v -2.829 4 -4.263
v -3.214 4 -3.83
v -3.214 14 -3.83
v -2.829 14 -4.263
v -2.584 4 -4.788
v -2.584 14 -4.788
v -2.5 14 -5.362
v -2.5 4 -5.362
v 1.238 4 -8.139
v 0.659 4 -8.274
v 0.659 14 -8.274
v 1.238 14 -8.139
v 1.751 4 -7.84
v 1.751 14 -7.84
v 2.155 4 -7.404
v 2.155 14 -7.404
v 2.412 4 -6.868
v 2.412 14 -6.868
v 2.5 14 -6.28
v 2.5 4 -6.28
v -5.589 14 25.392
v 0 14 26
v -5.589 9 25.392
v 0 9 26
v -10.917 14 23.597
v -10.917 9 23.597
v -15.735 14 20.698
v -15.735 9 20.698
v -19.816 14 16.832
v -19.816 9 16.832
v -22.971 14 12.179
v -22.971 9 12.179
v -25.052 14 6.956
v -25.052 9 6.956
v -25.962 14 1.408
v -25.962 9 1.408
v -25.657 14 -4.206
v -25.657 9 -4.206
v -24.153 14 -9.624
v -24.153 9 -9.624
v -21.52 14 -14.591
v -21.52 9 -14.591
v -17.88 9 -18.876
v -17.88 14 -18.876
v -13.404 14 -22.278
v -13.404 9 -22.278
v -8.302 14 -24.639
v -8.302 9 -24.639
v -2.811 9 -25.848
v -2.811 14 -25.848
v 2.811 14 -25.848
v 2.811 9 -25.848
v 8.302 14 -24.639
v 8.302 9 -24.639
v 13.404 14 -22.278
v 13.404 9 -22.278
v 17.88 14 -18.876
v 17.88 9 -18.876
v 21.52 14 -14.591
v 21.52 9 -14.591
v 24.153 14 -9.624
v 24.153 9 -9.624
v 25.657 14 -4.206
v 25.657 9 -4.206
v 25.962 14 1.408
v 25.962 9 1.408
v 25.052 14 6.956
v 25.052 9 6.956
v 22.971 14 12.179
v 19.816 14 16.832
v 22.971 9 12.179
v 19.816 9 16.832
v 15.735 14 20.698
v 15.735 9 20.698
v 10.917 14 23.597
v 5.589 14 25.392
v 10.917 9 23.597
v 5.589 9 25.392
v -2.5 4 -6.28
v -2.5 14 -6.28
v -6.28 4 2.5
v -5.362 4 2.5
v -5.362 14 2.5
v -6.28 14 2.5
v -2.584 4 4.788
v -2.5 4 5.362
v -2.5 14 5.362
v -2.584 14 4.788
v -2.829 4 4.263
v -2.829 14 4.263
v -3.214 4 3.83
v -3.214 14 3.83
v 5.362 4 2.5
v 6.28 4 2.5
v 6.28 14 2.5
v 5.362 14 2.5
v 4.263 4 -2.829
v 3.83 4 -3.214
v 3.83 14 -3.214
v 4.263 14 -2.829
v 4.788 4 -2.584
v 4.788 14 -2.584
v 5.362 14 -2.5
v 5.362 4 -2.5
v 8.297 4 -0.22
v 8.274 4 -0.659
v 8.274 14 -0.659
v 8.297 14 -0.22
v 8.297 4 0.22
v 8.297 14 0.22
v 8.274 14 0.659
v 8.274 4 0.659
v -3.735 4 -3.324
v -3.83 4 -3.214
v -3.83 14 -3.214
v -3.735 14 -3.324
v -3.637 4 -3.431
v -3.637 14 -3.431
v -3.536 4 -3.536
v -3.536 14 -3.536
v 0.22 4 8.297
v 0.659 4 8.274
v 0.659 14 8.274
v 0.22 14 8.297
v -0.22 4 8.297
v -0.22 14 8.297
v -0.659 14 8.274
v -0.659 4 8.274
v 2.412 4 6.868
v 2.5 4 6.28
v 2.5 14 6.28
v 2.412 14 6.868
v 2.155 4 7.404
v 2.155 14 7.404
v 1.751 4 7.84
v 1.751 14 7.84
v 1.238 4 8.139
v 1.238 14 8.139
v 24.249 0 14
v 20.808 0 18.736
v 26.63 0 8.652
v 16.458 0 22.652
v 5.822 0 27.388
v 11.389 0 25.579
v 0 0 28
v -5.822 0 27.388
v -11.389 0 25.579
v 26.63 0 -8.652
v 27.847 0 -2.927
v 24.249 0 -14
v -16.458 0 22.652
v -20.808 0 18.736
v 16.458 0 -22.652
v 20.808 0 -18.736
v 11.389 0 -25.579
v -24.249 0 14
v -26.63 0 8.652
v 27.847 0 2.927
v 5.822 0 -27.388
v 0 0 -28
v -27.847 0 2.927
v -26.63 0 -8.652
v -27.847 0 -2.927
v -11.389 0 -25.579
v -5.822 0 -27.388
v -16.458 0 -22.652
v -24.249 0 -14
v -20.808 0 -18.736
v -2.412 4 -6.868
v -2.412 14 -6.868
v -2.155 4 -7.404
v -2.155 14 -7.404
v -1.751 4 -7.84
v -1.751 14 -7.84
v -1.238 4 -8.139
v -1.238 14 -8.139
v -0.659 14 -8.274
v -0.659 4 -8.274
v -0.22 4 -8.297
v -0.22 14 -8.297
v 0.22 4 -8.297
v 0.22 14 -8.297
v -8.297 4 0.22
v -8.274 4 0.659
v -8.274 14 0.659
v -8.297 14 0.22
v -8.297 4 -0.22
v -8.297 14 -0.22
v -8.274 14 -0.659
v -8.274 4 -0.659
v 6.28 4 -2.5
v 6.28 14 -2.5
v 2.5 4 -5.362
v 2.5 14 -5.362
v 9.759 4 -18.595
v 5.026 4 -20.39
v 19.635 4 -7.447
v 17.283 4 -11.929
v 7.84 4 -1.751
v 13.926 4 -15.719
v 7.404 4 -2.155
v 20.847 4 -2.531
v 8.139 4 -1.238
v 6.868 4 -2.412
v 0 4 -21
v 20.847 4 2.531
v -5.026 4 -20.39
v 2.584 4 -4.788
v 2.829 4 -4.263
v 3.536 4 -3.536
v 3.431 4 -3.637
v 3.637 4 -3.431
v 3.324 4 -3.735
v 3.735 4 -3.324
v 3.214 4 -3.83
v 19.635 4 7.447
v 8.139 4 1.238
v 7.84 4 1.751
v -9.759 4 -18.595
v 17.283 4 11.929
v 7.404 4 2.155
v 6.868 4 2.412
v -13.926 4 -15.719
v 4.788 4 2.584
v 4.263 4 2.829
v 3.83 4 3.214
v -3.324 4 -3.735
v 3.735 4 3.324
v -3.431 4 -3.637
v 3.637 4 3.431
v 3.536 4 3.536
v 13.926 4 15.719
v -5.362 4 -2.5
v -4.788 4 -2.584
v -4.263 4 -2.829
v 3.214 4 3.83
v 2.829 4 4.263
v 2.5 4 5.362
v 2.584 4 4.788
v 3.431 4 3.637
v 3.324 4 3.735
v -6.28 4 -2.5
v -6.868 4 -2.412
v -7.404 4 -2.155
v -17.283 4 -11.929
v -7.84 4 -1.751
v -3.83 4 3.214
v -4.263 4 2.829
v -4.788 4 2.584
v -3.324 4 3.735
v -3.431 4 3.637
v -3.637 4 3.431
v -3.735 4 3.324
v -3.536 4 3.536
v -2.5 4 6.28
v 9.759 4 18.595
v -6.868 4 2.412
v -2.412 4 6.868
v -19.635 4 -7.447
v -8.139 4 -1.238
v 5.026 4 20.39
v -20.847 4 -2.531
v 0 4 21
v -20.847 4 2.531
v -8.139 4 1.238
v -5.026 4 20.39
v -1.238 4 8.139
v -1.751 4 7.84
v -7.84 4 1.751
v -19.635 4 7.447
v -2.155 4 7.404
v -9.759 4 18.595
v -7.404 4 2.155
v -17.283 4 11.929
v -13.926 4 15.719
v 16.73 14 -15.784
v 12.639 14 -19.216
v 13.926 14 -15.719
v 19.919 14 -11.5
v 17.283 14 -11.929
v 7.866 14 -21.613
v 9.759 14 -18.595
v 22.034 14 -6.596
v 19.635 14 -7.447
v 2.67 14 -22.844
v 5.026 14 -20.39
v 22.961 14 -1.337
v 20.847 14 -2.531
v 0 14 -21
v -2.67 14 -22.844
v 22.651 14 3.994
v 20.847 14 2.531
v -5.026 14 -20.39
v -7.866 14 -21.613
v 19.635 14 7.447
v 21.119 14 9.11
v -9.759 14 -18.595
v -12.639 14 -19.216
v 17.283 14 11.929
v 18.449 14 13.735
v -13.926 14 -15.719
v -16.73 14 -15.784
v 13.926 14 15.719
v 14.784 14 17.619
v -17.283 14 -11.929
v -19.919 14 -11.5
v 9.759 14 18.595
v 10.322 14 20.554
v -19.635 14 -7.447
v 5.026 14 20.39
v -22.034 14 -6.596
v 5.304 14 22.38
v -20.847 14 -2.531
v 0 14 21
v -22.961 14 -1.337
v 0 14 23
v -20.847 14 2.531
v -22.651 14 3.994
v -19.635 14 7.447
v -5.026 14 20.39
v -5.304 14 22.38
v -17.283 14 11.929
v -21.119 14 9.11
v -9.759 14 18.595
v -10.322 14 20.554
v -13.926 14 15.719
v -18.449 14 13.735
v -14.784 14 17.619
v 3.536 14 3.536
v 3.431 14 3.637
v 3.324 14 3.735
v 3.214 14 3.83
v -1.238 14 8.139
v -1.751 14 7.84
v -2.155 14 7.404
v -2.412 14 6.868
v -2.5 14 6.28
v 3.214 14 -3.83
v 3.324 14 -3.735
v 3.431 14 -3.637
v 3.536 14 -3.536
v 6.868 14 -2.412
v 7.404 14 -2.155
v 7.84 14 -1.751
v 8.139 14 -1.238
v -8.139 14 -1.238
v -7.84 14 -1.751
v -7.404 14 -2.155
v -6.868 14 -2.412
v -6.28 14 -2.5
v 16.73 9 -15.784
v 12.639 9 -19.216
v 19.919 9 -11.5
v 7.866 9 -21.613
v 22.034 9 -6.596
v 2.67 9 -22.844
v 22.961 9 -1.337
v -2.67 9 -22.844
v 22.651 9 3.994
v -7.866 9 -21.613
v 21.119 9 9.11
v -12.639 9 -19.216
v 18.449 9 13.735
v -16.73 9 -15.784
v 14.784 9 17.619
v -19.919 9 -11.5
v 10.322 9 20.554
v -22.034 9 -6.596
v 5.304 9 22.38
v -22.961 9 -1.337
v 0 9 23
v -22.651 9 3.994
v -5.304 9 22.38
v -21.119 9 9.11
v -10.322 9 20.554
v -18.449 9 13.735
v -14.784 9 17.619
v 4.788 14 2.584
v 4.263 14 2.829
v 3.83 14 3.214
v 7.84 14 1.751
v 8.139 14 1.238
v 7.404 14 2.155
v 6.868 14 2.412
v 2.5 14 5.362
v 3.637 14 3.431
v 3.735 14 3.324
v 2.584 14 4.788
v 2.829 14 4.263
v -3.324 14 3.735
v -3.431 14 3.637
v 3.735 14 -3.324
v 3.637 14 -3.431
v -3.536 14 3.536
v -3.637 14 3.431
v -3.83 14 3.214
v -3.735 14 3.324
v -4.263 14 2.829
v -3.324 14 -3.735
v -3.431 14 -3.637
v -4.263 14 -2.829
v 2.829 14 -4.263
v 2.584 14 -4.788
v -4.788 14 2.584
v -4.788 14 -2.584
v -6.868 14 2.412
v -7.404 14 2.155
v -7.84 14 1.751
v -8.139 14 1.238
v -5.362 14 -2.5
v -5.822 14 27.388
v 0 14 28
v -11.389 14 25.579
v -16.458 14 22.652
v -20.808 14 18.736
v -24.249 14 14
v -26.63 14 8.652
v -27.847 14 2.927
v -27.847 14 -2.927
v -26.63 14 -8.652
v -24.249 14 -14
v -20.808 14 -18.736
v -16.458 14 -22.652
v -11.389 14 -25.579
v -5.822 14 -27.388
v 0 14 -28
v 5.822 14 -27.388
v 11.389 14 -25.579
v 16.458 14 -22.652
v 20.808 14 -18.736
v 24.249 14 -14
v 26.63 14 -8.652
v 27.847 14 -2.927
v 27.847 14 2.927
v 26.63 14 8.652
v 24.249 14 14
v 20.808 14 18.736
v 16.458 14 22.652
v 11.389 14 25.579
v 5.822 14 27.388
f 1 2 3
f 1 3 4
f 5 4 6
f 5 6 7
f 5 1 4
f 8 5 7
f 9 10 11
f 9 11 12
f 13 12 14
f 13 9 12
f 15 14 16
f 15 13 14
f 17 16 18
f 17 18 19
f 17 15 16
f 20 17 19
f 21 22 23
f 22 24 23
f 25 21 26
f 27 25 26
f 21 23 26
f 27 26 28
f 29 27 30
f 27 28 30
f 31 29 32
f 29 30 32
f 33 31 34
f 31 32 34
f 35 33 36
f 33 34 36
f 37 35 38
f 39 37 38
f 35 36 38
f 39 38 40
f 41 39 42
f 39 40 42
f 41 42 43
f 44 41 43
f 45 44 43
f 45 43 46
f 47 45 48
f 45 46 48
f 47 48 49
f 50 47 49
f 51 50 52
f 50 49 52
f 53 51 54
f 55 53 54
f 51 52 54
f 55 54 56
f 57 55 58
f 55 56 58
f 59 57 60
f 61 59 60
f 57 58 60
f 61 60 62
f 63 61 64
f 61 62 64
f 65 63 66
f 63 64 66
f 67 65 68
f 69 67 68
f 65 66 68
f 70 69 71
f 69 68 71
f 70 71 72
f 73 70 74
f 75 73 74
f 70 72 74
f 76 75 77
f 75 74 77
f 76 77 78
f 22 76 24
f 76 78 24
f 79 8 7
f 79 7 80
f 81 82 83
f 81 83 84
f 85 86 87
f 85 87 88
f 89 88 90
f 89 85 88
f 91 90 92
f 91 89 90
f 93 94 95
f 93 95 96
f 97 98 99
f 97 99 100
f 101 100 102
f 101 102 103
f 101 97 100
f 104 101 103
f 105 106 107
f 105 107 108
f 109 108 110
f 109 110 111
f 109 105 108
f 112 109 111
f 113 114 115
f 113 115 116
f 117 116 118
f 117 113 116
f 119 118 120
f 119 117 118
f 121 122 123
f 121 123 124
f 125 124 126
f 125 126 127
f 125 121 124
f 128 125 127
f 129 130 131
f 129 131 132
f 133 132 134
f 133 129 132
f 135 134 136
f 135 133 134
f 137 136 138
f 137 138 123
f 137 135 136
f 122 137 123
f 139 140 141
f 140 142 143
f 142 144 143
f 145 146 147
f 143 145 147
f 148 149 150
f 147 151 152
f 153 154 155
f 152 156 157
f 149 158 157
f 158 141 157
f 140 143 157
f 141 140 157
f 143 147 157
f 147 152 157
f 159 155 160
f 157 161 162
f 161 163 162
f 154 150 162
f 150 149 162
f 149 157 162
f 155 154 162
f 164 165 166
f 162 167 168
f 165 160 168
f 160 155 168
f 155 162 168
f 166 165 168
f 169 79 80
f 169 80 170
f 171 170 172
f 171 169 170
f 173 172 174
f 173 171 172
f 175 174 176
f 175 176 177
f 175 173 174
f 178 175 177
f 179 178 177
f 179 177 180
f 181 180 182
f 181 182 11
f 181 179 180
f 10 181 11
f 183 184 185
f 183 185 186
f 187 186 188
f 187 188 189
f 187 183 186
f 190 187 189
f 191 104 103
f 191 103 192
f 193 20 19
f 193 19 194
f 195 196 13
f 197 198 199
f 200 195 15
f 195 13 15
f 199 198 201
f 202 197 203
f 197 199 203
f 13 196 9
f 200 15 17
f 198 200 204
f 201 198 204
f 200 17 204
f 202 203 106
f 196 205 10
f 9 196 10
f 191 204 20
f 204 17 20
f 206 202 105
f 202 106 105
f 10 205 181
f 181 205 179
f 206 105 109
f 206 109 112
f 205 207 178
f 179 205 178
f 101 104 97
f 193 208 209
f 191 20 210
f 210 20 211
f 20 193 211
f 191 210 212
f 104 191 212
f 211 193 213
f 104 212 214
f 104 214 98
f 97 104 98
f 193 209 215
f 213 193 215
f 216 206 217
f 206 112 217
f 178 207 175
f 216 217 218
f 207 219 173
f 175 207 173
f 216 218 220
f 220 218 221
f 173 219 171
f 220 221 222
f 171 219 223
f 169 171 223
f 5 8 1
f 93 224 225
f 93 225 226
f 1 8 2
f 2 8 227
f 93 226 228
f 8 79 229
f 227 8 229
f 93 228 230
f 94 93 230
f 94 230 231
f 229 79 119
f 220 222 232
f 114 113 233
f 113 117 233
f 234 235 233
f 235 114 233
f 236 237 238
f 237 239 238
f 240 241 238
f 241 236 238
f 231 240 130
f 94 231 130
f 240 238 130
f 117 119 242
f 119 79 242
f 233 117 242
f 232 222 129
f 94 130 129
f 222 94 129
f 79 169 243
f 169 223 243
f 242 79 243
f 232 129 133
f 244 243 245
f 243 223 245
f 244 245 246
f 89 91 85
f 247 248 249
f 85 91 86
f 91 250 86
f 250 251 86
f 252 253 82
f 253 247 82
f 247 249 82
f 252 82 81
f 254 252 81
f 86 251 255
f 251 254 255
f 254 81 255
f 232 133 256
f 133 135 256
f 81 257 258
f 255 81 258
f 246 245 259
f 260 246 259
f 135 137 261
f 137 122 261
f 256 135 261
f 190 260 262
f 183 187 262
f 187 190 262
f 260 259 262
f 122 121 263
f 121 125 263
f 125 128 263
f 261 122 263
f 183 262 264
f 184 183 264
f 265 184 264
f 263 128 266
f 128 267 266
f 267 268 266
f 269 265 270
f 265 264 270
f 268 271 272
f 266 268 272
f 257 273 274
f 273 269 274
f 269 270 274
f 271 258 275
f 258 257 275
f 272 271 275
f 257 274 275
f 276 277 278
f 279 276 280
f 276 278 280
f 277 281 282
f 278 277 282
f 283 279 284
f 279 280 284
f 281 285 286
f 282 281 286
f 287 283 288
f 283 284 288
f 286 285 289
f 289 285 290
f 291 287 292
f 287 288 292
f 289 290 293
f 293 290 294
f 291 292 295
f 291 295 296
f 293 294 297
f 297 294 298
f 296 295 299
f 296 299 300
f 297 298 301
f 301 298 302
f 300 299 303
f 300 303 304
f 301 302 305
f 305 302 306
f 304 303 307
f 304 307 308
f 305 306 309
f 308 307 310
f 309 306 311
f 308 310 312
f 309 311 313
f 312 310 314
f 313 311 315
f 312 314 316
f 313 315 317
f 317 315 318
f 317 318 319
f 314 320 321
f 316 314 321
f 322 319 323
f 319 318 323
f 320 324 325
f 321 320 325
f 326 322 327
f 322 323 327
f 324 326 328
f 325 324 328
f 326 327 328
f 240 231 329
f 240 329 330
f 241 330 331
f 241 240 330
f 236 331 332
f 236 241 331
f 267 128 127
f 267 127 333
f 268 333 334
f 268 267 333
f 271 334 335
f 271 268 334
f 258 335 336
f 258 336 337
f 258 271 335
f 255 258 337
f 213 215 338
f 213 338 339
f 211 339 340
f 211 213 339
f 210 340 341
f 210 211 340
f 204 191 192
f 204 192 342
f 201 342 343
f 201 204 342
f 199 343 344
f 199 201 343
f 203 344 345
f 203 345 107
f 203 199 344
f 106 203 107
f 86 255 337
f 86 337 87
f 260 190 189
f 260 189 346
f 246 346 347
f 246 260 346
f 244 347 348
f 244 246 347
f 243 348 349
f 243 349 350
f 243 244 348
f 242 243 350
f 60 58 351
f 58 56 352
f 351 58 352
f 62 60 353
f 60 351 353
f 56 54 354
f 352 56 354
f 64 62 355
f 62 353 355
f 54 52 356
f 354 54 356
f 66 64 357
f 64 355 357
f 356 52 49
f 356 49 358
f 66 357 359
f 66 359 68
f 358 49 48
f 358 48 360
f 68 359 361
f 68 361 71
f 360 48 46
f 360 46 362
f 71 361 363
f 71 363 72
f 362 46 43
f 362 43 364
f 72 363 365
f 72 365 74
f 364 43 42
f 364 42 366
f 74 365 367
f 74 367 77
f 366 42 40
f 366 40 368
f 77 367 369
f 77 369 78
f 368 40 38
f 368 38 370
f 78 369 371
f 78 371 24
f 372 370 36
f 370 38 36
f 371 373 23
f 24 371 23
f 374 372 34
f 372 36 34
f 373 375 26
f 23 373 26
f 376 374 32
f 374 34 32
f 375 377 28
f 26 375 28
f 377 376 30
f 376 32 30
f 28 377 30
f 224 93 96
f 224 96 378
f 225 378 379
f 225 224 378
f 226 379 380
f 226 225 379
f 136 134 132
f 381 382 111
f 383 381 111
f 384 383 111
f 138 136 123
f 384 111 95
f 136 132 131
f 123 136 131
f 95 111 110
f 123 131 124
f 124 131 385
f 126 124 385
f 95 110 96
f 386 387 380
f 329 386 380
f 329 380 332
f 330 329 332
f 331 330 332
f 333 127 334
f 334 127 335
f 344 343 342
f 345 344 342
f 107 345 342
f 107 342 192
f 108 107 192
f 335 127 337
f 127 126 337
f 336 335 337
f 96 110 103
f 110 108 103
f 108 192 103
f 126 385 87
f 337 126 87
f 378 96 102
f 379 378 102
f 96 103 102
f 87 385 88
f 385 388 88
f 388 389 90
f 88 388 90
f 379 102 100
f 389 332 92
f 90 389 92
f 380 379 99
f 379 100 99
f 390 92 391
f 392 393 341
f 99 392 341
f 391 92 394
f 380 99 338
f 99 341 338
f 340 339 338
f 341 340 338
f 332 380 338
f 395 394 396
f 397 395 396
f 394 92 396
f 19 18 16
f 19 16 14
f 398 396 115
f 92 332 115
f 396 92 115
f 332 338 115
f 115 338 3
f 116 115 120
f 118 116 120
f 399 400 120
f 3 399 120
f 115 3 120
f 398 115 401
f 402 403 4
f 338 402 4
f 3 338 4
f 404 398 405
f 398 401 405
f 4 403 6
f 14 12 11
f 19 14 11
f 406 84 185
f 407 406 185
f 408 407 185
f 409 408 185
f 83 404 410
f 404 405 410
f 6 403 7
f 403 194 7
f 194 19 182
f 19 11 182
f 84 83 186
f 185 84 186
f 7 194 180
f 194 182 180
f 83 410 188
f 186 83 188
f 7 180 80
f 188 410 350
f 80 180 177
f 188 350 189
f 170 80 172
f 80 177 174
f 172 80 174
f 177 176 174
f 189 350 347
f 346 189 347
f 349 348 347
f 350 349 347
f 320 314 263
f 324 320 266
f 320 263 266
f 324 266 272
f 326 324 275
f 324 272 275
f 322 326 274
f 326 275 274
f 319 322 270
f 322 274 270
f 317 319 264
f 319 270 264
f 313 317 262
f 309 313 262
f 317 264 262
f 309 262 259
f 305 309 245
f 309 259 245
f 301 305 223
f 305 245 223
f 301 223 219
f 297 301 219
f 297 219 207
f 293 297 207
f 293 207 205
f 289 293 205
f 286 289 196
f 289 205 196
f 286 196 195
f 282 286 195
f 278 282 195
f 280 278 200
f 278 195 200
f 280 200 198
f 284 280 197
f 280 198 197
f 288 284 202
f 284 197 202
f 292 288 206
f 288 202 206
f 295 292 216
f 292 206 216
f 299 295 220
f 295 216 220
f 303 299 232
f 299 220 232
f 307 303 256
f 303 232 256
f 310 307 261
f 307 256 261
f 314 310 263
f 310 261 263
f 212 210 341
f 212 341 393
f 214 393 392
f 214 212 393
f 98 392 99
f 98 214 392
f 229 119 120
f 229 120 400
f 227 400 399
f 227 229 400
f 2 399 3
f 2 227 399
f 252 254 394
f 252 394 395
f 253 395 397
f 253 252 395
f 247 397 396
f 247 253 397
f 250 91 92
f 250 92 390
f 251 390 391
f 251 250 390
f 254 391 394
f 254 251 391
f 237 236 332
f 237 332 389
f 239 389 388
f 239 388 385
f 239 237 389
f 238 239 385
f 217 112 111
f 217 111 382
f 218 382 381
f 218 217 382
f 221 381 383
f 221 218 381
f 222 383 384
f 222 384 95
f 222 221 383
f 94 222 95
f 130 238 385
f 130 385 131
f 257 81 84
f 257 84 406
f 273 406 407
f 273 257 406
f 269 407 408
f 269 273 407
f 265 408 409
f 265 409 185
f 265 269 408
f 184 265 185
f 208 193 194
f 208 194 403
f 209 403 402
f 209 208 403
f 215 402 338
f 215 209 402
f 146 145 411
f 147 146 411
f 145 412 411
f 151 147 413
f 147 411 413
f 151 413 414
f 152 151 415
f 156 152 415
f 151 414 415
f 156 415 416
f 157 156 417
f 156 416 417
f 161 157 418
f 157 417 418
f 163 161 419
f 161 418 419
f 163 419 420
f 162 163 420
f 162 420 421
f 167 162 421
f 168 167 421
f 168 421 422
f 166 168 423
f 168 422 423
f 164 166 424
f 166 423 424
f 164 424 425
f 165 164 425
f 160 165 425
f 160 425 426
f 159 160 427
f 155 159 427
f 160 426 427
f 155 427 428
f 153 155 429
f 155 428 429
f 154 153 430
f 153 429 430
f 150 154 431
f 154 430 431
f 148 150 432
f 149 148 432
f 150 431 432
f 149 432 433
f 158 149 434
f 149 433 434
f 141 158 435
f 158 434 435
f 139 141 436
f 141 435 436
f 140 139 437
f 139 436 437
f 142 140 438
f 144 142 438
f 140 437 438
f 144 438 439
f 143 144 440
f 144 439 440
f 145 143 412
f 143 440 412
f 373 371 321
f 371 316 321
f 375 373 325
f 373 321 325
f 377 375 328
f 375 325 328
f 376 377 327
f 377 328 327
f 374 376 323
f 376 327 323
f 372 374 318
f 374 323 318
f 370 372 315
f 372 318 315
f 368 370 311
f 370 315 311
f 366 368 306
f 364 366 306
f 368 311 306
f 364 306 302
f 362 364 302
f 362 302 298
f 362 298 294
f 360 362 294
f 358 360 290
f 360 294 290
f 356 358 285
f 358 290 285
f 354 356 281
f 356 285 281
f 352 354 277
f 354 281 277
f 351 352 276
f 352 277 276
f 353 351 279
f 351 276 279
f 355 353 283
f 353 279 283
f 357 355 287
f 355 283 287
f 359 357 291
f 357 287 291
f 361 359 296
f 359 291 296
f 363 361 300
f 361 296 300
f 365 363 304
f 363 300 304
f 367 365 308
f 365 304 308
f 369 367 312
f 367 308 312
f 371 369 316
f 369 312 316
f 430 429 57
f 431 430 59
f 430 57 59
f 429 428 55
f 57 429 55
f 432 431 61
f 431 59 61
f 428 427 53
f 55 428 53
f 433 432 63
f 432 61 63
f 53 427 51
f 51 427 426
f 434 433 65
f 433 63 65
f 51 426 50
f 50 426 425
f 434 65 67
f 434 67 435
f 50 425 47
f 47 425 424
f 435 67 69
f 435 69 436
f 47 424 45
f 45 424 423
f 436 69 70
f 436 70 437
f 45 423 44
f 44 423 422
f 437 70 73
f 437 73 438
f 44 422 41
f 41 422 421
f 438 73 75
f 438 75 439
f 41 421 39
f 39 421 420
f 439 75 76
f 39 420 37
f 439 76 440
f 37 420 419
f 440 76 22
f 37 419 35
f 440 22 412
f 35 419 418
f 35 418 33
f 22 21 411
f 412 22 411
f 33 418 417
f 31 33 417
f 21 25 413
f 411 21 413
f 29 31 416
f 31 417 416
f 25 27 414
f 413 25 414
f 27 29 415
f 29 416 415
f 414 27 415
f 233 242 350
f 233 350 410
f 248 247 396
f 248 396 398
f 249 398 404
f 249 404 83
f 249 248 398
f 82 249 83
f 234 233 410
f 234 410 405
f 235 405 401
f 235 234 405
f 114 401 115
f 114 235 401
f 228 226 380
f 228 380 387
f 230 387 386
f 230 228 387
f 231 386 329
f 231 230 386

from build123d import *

# Parameters (mm, degrees)
BOSS_EXTRUDE1_DEPTH = 10


with BuildPart() as part:
    # Sketch1 → Revolve1 (revolve)
    with BuildSketch(Plane.XY, mode=Mode.PRIVATE) as revolve1_sk:
        Polygon((0, 0), (-28, 0), (-28, 14), (-26, 14), (-26, 9), (-23, 9), (-23, 14), (-21, 14), (-21, 4), (0, 4), align=None)
    revolve(revolve1_sk.sketch.rotate(Axis((0, 4, 0), (0, -1, 0)), 270), axis=Axis((0, 4, 0), (0, -1, 0)))

    # Sketch3 → Boss-Extrude1 (add)
    with BuildSketch(Plane(origin=(0, 4, 0), x_dir=(1, 0, 0), z_dir=(0, 1, 0))):
        with BuildLine():
            ThreePointArc((-3.829930462, -3.214285714), (-4.516748393, -2.687346066), (-5.361902647, -2.5))
            Line((-5.361902647, -2.5), (-6.280127387, -2.5))
            ThreePointArc((-6.280127387, -2.5), (-7.637061373, -1.969261773), (-8.273818621, -0.658730159))
            ThreePointArc((-8.273818621, -0.658730159), (-8.3, 0), (-8.273818621, 0.658730159))
            ThreePointArc((-8.273818621, 0.658730159), (-7.637061373, 1.969261773), (-6.280127387, 2.5))
            Line((-6.280127387, 2.5), (-5.361902647, 2.5))
            ThreePointArc((-5.361902647, 2.5), (-4.516748393, 2.687346066), (-3.829930462, 3.214285714))
            ThreePointArc((-3.829930462, 3.214285714), (-3.686233368, 3.378118346), (-3.535533906, 3.535533906))
            ThreePointArc((-3.535533906, 3.535533906), (-3.378118346, 3.686233368), (-3.214285714, 3.829930462))
            ThreePointArc((-3.214285714, 3.829930462), (-2.687346066, 4.516748393), (-2.5, 5.361902647))
            Line((-2.5, 5.361902647), (-2.5, 6.280127387))
            ThreePointArc((-2.5, 6.280127387), (-1.969261773, 7.637061373), (-0.658730159, 8.273818621))
            ThreePointArc((-0.658730159, 8.273818621), (0, 8.3), (0.658730159, 8.273818621))
            ThreePointArc((0.658730159, 8.273818621), (1.969261773, 7.637061373), (2.5, 6.280127387))
            Line((2.5, 6.280127387), (2.5, 5.361902647))
            ThreePointArc((2.5, 5.361902647), (2.687346066, 4.516748393), (3.214285714, 3.829930462))
            ThreePointArc((3.214285714, 3.829930462), (3.378118346, 3.686233368), (3.535533906, 3.535533906))
            ThreePointArc((3.535533906, 3.535533906), (3.686233368, 3.378118346), (3.829930462, 3.214285714))
            ThreePointArc((3.829930462, 3.214285714), (4.516748393, 2.687346066), (5.361902647, 2.5))
            Line((5.361902647, 2.5), (6.280127387, 2.5))
            ThreePointArc((6.280127387, 2.5), (7.637061373, 1.969261773), (8.273818621, 0.658730159))
            ThreePointArc((8.273818621, 0.658730159), (8.3, 0), (8.273818621, -0.658730159))
            ThreePointArc((8.273818621, -0.658730159), (7.637061373, -1.969261773), (6.280127387, -2.5))
            Line((6.280127387, -2.5), (5.361902647, -2.5))
            ThreePointArc((5.361902647, -2.5), (4.516748393, -2.687346066), (3.829930462, -3.214285714))
            ThreePointArc((3.829930462, -3.214285714), (3.686233368, -3.378118346), (3.535533906, -3.535533906))
            ThreePointArc((3.535533906, -3.535533906), (3.378118346, -3.686233368), (3.214285714, -3.829930462))
            ThreePointArc((3.214285714, -3.829930462), (2.687346066, -4.516748393), (2.5, -5.361902647))
            Line((2.5, -5.361902647), (2.5, -6.280127387))
            ThreePointArc((2.5, -6.280127387), (1.969261773, -7.637061373), (0.658730159, -8.273818621))
            ThreePointArc((0.658730159, -8.273818621), (0, -8.3), (-0.658730159, -8.273818621))
            ThreePointArc((-0.658730159, -8.273818621), (-1.969261773, -7.637061373), (-2.5, -6.280127387))
            Line((-2.5, -6.280127387), (-2.5, -5.361902647))
            ThreePointArc((-2.5, -5.361902647), (-2.687346066, -4.516748393), (-3.214285714, -3.829930462))
            ThreePointArc((-3.214285714, -3.829930462), (-3.378118346, -3.686233368), (-3.535533906, -3.535533906))
            ThreePointArc((-3.535533906, -3.535533906), (-3.686233368, -3.378118346), (-3.829930462, -3.214285714))
        make_face()
    extrude(amount=BOSS_EXTRUDE1_DEPTH)


solid = part.part
